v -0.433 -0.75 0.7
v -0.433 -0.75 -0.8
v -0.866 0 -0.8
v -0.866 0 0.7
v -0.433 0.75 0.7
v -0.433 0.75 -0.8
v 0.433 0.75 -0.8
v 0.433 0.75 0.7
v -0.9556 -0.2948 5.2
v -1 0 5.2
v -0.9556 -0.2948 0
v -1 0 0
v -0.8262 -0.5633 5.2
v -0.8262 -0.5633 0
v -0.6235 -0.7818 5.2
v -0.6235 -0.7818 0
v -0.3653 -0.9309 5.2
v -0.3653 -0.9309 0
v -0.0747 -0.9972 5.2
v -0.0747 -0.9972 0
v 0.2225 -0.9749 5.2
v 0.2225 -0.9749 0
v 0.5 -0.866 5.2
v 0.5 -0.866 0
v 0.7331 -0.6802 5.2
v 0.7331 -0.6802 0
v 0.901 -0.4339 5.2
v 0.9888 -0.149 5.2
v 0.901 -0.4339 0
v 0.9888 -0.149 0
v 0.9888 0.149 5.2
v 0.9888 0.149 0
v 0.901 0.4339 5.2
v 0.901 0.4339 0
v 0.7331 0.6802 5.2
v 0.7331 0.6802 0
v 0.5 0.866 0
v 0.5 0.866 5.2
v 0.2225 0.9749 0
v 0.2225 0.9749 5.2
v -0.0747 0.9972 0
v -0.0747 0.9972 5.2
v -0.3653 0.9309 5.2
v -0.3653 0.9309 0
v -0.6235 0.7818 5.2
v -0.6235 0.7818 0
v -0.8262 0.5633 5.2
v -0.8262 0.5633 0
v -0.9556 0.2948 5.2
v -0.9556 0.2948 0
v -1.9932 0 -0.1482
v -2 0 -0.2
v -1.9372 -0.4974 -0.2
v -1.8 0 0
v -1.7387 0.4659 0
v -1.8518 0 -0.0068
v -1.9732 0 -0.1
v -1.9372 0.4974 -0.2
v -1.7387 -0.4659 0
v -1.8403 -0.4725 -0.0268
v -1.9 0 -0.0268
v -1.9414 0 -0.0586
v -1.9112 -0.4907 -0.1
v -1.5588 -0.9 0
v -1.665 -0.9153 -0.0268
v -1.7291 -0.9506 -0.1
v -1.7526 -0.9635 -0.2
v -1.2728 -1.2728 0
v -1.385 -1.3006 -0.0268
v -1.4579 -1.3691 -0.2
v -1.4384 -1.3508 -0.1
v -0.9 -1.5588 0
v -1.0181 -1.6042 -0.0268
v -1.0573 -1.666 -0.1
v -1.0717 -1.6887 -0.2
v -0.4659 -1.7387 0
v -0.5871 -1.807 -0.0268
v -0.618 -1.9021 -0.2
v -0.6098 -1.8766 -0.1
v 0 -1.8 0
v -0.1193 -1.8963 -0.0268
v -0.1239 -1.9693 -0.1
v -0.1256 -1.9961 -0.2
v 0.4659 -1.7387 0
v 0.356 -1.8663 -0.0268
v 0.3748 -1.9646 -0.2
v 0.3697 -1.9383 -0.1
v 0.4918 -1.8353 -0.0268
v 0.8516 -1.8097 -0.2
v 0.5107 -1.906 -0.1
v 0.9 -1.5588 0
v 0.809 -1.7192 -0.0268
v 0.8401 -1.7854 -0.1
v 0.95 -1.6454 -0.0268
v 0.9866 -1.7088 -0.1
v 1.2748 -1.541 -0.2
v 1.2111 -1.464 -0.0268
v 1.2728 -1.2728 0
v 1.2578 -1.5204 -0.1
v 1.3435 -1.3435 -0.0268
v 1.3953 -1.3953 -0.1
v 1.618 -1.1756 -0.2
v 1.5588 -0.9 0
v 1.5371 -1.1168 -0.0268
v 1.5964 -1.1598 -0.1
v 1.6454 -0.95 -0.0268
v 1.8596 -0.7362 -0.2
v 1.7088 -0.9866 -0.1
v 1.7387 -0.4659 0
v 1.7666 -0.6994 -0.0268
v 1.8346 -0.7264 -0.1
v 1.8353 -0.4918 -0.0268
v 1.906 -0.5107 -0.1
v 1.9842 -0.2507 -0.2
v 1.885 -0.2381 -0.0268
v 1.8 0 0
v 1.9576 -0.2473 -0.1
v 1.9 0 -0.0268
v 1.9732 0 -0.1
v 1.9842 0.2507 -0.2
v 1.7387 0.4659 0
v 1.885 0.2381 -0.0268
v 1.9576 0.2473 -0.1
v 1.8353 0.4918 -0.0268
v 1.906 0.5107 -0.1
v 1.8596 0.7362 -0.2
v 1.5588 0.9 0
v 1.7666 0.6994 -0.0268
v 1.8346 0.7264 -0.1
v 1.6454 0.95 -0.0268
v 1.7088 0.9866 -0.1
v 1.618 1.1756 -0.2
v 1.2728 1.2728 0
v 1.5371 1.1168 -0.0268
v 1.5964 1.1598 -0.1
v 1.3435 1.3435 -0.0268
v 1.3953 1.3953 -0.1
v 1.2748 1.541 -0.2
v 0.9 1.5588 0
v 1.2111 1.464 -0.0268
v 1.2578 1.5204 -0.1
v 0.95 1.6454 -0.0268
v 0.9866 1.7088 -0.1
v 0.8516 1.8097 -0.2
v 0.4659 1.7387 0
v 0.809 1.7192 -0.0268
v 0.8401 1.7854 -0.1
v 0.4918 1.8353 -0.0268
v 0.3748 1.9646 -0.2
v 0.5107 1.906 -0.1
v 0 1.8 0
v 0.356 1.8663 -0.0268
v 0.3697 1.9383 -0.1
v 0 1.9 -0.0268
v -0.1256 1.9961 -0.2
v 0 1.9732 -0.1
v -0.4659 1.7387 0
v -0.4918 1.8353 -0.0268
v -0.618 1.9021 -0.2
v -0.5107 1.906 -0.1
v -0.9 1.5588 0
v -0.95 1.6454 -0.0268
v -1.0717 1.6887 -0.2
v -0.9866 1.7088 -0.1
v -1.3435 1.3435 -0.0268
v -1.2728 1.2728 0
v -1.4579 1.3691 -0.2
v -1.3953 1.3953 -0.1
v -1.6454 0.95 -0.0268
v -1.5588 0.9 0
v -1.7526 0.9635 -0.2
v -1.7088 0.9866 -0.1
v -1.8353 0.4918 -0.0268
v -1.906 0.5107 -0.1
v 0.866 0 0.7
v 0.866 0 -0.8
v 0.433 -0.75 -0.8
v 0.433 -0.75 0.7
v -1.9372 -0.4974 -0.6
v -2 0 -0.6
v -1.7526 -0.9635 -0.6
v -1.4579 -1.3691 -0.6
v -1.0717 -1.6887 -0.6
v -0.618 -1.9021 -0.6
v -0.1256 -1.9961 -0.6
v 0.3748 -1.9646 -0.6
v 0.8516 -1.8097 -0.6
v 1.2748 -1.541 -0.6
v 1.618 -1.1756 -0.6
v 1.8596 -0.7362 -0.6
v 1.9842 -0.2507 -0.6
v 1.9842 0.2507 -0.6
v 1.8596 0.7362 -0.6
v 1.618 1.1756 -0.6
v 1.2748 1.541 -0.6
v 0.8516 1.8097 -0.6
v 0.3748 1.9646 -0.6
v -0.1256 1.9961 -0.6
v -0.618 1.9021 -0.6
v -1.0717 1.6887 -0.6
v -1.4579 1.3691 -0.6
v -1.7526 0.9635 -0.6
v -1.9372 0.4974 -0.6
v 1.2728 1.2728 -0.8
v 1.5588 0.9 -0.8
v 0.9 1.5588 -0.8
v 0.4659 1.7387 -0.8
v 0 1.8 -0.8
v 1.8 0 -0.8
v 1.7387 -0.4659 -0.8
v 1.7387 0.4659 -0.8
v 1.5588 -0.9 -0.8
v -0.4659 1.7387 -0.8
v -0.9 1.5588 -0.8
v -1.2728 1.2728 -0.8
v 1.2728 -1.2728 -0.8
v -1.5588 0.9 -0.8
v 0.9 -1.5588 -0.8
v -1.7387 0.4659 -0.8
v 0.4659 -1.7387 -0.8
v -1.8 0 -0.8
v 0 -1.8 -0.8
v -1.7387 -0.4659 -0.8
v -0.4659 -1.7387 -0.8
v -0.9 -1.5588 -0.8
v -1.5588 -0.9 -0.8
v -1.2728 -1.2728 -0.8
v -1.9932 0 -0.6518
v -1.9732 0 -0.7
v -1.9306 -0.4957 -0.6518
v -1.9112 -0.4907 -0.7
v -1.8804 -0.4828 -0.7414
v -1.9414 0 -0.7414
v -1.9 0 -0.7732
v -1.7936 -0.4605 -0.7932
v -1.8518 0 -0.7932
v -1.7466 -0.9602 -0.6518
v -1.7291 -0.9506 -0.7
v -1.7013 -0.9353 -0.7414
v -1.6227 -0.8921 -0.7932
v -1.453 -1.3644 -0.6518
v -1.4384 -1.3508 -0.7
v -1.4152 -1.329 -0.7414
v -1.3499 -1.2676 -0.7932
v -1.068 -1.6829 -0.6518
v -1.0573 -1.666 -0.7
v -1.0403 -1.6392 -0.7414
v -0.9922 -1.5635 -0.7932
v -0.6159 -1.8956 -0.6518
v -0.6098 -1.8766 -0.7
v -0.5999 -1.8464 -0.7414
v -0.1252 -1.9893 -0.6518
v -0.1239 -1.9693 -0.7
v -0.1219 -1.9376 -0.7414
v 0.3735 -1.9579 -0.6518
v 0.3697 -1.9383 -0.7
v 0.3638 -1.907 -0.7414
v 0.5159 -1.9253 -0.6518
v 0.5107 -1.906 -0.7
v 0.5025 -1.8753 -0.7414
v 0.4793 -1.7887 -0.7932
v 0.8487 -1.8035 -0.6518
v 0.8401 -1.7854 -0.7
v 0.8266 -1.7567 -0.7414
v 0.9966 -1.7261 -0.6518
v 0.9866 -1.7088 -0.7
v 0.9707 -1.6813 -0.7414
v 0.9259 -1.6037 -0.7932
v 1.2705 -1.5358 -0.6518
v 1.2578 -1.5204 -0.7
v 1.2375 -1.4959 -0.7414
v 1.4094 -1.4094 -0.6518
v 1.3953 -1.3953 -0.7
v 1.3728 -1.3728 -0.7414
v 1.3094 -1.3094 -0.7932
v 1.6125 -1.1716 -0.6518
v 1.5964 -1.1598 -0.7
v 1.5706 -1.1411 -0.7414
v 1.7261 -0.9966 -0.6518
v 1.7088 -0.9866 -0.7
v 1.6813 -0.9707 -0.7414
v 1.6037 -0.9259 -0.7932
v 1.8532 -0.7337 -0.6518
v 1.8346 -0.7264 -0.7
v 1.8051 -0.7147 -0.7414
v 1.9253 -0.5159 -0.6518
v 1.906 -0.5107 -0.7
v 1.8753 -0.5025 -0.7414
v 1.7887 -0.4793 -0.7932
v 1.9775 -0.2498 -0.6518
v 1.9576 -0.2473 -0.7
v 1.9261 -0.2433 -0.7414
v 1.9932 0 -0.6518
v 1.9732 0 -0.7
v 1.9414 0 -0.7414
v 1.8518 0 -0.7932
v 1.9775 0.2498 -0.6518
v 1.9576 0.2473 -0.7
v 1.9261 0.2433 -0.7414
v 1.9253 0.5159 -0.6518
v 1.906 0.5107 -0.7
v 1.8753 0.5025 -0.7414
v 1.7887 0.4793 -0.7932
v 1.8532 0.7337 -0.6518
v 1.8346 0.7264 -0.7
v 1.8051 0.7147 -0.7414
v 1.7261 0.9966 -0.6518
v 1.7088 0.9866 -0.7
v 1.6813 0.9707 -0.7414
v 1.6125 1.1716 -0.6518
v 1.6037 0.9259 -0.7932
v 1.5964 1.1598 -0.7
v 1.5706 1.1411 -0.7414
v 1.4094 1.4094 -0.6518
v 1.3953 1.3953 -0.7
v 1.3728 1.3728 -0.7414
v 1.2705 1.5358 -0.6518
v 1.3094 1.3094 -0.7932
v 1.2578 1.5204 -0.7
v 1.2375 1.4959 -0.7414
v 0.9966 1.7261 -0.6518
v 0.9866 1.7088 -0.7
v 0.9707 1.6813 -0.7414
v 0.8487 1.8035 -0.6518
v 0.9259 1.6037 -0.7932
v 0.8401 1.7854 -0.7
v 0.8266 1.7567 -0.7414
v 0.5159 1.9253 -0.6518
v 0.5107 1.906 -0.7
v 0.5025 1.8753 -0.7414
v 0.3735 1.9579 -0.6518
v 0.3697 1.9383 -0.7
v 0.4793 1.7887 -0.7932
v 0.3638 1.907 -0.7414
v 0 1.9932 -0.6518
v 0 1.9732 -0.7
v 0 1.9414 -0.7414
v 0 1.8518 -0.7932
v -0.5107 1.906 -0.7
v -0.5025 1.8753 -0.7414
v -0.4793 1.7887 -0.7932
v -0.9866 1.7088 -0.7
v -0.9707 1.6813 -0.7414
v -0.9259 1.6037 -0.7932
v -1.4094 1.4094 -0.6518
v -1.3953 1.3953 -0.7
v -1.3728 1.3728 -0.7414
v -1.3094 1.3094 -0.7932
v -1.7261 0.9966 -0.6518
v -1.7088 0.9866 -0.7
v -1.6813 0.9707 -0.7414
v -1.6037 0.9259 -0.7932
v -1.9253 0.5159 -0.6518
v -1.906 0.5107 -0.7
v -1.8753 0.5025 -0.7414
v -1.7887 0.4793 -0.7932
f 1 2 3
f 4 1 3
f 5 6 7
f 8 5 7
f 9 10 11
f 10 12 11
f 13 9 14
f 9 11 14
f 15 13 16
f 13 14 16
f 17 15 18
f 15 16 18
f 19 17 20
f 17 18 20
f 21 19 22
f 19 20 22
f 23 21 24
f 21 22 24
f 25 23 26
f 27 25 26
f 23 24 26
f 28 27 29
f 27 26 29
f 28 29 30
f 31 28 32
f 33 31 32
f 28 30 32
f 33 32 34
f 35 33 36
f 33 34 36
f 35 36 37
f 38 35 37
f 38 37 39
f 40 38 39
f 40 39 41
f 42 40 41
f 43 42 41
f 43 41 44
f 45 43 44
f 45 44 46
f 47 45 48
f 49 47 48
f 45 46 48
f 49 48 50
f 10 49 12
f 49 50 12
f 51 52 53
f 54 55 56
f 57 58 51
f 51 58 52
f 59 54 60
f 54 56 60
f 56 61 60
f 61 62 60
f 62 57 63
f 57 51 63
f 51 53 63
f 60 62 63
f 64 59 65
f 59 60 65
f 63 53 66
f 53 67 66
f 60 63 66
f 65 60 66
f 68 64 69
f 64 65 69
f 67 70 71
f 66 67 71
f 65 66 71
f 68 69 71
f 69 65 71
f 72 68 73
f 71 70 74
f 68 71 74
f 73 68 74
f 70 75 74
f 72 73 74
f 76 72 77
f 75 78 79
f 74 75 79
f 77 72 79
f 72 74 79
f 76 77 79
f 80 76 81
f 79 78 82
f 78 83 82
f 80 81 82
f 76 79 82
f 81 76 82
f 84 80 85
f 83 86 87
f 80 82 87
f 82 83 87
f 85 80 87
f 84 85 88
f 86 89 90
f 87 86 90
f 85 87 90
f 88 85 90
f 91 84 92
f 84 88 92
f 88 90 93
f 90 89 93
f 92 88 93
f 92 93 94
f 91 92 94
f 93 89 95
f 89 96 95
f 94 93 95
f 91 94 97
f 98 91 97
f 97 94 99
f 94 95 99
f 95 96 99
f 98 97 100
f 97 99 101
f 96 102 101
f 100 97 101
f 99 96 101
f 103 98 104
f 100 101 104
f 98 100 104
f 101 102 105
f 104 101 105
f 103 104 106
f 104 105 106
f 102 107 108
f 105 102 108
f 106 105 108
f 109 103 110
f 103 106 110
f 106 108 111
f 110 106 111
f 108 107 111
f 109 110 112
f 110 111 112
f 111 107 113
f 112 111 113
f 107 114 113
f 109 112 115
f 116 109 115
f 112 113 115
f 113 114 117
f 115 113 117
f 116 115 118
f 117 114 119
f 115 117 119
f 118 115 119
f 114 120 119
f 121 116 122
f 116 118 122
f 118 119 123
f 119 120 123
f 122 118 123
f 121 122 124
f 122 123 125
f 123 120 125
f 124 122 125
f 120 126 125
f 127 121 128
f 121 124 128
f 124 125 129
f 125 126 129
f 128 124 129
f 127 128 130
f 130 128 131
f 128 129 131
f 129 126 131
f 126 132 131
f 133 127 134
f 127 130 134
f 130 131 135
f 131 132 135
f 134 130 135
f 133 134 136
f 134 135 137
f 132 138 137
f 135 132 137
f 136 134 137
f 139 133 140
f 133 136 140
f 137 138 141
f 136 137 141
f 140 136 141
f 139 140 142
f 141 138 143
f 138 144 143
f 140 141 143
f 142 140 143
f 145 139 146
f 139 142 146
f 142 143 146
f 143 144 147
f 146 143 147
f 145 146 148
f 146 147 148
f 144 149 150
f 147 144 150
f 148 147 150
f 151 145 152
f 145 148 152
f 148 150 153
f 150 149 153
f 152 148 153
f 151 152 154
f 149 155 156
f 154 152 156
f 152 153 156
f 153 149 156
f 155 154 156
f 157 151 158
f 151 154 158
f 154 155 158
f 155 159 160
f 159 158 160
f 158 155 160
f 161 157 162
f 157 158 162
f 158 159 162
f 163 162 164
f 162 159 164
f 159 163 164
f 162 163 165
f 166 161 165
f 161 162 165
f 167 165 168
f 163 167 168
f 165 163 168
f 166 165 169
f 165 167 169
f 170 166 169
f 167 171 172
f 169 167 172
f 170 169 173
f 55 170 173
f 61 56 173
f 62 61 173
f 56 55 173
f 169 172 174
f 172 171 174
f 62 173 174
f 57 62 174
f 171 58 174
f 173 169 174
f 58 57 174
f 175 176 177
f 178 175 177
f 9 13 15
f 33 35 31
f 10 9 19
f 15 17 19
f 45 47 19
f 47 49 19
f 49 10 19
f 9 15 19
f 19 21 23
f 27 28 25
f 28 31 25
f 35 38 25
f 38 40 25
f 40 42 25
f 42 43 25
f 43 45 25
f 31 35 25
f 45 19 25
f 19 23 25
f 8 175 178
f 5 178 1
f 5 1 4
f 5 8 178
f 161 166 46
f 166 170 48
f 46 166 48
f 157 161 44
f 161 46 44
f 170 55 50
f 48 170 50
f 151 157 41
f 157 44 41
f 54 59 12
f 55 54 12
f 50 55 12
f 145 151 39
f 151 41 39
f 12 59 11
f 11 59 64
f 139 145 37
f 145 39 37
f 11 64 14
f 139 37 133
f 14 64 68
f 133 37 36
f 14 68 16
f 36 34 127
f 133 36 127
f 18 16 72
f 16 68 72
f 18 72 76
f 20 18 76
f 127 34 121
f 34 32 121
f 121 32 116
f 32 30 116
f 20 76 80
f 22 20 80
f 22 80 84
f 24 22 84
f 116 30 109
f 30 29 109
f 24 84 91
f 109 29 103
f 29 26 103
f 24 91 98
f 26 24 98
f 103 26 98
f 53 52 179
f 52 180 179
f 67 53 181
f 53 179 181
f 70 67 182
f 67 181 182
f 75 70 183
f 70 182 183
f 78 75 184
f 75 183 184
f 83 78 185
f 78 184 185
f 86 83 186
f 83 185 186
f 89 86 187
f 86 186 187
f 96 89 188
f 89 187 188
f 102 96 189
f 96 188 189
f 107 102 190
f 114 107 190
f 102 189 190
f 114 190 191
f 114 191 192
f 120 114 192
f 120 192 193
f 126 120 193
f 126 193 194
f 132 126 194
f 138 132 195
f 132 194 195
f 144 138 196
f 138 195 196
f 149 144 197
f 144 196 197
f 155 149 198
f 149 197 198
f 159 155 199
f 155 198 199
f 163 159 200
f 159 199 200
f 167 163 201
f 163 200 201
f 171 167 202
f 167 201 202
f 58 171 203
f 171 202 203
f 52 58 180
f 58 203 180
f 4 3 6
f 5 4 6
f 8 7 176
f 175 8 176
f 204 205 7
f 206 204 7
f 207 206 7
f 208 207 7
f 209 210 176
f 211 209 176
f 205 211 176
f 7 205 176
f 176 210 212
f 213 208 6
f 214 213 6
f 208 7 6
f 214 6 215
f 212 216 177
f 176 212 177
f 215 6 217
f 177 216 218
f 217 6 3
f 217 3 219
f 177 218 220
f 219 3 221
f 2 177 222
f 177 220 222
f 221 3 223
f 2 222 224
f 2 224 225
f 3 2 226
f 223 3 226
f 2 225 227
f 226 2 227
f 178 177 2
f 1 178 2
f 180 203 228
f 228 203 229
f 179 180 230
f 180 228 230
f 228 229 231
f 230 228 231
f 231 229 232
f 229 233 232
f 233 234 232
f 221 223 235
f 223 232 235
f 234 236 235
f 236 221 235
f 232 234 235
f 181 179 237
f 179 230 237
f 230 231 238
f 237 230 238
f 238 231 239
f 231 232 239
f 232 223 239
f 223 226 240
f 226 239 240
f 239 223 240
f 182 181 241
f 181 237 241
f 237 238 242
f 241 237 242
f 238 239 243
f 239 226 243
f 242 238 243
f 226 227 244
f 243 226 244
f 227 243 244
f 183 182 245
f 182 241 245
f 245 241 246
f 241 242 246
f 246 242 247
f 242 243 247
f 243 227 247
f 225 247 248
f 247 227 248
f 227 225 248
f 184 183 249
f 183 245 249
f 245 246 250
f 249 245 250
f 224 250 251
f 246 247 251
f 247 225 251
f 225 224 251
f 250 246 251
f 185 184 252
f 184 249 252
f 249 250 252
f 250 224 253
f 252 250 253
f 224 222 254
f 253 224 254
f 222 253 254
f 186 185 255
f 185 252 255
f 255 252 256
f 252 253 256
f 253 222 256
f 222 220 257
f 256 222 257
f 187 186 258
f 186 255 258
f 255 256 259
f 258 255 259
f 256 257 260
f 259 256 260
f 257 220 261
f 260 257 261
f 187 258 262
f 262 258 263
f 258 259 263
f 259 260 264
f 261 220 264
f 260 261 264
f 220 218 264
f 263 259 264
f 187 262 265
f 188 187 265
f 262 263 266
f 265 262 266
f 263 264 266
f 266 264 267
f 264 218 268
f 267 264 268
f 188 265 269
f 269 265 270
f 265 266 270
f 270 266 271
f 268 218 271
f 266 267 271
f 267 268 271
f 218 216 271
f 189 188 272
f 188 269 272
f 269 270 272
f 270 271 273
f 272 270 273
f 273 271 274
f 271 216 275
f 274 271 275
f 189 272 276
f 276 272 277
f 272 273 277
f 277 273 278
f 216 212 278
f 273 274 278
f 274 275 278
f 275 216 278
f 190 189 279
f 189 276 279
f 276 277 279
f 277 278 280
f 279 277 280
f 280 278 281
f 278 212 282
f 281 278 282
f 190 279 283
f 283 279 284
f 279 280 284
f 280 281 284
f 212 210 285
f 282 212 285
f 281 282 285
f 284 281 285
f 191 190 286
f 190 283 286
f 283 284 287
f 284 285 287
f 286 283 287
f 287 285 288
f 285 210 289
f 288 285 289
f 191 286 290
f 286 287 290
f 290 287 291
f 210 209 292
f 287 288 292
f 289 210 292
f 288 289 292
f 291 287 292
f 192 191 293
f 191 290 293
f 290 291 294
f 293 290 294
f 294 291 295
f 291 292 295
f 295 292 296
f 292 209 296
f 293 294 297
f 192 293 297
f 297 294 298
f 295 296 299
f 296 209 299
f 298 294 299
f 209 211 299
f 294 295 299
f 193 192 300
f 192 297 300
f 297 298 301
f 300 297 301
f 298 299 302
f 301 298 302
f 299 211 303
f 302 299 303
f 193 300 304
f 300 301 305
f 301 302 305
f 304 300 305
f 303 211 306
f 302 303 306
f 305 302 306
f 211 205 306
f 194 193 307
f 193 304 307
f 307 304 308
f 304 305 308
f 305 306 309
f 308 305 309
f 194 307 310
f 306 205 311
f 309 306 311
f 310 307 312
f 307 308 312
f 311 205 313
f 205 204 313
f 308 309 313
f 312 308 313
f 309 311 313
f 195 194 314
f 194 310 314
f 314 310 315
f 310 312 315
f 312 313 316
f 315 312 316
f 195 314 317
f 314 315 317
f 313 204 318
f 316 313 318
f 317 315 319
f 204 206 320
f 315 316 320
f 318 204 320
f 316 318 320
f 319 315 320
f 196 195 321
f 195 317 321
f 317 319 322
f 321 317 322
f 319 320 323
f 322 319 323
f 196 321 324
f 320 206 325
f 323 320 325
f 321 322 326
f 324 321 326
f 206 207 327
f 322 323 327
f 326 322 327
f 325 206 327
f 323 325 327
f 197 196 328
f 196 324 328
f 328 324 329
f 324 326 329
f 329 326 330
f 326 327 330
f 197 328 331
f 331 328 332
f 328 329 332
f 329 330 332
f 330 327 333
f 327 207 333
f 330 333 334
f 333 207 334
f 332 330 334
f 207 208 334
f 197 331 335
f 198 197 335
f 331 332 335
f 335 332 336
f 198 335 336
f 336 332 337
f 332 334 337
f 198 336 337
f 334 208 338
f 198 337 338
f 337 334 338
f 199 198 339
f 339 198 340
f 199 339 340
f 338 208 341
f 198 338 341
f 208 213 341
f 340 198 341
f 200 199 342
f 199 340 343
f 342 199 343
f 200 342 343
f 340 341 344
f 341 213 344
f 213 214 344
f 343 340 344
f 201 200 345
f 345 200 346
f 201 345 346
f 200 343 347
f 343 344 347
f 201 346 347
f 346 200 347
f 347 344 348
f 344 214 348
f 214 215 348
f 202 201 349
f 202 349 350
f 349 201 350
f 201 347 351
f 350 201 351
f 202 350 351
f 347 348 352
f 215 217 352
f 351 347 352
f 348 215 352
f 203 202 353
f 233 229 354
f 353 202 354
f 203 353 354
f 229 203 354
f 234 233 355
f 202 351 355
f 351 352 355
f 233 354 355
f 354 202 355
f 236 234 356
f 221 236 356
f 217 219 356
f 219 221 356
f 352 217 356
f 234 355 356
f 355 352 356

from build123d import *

# Parameters (mm, degrees)
CUT_EXTRUDE_2_DEPTH = 1.5


with BuildPart() as part:
    # 草图1 → 旋转1 (revolve)
    with BuildSketch(Plane(origin=(0, 0, 0), x_dir=(1, 0, 0), z_dir=(0, 1, 0)), mode=Mode.PRIVATE) as revolve_1_sk:
        with BuildLine():
            Line((0, 0), (0, -5.2))
            Line((0, -5.2), (1, -5.2))
            Line((1, -5.2), (1, 0))
            Line((1, 0), (1.8, 0))
            ThreePointArc((1.8, 0), (1.941421356, 0.058578644), (2, 0.2))
            Line((2, 0.2), (2, 0.6))
            ThreePointArc((2, 0.6), (1.941421356, 0.741421356), (1.8, 0.8))
            Line((1.8, 0.8), (0, 0.8))
            Line((0, 0.8), (0, 0))
        make_face()
    revolve(revolve_1_sk.sketch.rotate(Axis((0, 0, 0), (0, 0, 1)), 180), axis=Axis((0, 0, 0), (0, 0, 1)))

    # 草图3 → 切除-拉伸2 (cut)
    with BuildSketch(Plane(origin=(0, 0, -0.8), x_dir=(-1, 0, 0), z_dir=(0, 0, -1))):
        Polygon((0.866025404, 0), (0.433012702, 0.75), (-0.433012702, 0.75), (-0.866025404, 0), (-0.433012702, -0.75), (0.433012702, -0.75), align=None)
    extrude(amount=-CUT_EXTRUDE_2_DEPTH, mode=Mode.SUBTRACT)


solid = part.part
